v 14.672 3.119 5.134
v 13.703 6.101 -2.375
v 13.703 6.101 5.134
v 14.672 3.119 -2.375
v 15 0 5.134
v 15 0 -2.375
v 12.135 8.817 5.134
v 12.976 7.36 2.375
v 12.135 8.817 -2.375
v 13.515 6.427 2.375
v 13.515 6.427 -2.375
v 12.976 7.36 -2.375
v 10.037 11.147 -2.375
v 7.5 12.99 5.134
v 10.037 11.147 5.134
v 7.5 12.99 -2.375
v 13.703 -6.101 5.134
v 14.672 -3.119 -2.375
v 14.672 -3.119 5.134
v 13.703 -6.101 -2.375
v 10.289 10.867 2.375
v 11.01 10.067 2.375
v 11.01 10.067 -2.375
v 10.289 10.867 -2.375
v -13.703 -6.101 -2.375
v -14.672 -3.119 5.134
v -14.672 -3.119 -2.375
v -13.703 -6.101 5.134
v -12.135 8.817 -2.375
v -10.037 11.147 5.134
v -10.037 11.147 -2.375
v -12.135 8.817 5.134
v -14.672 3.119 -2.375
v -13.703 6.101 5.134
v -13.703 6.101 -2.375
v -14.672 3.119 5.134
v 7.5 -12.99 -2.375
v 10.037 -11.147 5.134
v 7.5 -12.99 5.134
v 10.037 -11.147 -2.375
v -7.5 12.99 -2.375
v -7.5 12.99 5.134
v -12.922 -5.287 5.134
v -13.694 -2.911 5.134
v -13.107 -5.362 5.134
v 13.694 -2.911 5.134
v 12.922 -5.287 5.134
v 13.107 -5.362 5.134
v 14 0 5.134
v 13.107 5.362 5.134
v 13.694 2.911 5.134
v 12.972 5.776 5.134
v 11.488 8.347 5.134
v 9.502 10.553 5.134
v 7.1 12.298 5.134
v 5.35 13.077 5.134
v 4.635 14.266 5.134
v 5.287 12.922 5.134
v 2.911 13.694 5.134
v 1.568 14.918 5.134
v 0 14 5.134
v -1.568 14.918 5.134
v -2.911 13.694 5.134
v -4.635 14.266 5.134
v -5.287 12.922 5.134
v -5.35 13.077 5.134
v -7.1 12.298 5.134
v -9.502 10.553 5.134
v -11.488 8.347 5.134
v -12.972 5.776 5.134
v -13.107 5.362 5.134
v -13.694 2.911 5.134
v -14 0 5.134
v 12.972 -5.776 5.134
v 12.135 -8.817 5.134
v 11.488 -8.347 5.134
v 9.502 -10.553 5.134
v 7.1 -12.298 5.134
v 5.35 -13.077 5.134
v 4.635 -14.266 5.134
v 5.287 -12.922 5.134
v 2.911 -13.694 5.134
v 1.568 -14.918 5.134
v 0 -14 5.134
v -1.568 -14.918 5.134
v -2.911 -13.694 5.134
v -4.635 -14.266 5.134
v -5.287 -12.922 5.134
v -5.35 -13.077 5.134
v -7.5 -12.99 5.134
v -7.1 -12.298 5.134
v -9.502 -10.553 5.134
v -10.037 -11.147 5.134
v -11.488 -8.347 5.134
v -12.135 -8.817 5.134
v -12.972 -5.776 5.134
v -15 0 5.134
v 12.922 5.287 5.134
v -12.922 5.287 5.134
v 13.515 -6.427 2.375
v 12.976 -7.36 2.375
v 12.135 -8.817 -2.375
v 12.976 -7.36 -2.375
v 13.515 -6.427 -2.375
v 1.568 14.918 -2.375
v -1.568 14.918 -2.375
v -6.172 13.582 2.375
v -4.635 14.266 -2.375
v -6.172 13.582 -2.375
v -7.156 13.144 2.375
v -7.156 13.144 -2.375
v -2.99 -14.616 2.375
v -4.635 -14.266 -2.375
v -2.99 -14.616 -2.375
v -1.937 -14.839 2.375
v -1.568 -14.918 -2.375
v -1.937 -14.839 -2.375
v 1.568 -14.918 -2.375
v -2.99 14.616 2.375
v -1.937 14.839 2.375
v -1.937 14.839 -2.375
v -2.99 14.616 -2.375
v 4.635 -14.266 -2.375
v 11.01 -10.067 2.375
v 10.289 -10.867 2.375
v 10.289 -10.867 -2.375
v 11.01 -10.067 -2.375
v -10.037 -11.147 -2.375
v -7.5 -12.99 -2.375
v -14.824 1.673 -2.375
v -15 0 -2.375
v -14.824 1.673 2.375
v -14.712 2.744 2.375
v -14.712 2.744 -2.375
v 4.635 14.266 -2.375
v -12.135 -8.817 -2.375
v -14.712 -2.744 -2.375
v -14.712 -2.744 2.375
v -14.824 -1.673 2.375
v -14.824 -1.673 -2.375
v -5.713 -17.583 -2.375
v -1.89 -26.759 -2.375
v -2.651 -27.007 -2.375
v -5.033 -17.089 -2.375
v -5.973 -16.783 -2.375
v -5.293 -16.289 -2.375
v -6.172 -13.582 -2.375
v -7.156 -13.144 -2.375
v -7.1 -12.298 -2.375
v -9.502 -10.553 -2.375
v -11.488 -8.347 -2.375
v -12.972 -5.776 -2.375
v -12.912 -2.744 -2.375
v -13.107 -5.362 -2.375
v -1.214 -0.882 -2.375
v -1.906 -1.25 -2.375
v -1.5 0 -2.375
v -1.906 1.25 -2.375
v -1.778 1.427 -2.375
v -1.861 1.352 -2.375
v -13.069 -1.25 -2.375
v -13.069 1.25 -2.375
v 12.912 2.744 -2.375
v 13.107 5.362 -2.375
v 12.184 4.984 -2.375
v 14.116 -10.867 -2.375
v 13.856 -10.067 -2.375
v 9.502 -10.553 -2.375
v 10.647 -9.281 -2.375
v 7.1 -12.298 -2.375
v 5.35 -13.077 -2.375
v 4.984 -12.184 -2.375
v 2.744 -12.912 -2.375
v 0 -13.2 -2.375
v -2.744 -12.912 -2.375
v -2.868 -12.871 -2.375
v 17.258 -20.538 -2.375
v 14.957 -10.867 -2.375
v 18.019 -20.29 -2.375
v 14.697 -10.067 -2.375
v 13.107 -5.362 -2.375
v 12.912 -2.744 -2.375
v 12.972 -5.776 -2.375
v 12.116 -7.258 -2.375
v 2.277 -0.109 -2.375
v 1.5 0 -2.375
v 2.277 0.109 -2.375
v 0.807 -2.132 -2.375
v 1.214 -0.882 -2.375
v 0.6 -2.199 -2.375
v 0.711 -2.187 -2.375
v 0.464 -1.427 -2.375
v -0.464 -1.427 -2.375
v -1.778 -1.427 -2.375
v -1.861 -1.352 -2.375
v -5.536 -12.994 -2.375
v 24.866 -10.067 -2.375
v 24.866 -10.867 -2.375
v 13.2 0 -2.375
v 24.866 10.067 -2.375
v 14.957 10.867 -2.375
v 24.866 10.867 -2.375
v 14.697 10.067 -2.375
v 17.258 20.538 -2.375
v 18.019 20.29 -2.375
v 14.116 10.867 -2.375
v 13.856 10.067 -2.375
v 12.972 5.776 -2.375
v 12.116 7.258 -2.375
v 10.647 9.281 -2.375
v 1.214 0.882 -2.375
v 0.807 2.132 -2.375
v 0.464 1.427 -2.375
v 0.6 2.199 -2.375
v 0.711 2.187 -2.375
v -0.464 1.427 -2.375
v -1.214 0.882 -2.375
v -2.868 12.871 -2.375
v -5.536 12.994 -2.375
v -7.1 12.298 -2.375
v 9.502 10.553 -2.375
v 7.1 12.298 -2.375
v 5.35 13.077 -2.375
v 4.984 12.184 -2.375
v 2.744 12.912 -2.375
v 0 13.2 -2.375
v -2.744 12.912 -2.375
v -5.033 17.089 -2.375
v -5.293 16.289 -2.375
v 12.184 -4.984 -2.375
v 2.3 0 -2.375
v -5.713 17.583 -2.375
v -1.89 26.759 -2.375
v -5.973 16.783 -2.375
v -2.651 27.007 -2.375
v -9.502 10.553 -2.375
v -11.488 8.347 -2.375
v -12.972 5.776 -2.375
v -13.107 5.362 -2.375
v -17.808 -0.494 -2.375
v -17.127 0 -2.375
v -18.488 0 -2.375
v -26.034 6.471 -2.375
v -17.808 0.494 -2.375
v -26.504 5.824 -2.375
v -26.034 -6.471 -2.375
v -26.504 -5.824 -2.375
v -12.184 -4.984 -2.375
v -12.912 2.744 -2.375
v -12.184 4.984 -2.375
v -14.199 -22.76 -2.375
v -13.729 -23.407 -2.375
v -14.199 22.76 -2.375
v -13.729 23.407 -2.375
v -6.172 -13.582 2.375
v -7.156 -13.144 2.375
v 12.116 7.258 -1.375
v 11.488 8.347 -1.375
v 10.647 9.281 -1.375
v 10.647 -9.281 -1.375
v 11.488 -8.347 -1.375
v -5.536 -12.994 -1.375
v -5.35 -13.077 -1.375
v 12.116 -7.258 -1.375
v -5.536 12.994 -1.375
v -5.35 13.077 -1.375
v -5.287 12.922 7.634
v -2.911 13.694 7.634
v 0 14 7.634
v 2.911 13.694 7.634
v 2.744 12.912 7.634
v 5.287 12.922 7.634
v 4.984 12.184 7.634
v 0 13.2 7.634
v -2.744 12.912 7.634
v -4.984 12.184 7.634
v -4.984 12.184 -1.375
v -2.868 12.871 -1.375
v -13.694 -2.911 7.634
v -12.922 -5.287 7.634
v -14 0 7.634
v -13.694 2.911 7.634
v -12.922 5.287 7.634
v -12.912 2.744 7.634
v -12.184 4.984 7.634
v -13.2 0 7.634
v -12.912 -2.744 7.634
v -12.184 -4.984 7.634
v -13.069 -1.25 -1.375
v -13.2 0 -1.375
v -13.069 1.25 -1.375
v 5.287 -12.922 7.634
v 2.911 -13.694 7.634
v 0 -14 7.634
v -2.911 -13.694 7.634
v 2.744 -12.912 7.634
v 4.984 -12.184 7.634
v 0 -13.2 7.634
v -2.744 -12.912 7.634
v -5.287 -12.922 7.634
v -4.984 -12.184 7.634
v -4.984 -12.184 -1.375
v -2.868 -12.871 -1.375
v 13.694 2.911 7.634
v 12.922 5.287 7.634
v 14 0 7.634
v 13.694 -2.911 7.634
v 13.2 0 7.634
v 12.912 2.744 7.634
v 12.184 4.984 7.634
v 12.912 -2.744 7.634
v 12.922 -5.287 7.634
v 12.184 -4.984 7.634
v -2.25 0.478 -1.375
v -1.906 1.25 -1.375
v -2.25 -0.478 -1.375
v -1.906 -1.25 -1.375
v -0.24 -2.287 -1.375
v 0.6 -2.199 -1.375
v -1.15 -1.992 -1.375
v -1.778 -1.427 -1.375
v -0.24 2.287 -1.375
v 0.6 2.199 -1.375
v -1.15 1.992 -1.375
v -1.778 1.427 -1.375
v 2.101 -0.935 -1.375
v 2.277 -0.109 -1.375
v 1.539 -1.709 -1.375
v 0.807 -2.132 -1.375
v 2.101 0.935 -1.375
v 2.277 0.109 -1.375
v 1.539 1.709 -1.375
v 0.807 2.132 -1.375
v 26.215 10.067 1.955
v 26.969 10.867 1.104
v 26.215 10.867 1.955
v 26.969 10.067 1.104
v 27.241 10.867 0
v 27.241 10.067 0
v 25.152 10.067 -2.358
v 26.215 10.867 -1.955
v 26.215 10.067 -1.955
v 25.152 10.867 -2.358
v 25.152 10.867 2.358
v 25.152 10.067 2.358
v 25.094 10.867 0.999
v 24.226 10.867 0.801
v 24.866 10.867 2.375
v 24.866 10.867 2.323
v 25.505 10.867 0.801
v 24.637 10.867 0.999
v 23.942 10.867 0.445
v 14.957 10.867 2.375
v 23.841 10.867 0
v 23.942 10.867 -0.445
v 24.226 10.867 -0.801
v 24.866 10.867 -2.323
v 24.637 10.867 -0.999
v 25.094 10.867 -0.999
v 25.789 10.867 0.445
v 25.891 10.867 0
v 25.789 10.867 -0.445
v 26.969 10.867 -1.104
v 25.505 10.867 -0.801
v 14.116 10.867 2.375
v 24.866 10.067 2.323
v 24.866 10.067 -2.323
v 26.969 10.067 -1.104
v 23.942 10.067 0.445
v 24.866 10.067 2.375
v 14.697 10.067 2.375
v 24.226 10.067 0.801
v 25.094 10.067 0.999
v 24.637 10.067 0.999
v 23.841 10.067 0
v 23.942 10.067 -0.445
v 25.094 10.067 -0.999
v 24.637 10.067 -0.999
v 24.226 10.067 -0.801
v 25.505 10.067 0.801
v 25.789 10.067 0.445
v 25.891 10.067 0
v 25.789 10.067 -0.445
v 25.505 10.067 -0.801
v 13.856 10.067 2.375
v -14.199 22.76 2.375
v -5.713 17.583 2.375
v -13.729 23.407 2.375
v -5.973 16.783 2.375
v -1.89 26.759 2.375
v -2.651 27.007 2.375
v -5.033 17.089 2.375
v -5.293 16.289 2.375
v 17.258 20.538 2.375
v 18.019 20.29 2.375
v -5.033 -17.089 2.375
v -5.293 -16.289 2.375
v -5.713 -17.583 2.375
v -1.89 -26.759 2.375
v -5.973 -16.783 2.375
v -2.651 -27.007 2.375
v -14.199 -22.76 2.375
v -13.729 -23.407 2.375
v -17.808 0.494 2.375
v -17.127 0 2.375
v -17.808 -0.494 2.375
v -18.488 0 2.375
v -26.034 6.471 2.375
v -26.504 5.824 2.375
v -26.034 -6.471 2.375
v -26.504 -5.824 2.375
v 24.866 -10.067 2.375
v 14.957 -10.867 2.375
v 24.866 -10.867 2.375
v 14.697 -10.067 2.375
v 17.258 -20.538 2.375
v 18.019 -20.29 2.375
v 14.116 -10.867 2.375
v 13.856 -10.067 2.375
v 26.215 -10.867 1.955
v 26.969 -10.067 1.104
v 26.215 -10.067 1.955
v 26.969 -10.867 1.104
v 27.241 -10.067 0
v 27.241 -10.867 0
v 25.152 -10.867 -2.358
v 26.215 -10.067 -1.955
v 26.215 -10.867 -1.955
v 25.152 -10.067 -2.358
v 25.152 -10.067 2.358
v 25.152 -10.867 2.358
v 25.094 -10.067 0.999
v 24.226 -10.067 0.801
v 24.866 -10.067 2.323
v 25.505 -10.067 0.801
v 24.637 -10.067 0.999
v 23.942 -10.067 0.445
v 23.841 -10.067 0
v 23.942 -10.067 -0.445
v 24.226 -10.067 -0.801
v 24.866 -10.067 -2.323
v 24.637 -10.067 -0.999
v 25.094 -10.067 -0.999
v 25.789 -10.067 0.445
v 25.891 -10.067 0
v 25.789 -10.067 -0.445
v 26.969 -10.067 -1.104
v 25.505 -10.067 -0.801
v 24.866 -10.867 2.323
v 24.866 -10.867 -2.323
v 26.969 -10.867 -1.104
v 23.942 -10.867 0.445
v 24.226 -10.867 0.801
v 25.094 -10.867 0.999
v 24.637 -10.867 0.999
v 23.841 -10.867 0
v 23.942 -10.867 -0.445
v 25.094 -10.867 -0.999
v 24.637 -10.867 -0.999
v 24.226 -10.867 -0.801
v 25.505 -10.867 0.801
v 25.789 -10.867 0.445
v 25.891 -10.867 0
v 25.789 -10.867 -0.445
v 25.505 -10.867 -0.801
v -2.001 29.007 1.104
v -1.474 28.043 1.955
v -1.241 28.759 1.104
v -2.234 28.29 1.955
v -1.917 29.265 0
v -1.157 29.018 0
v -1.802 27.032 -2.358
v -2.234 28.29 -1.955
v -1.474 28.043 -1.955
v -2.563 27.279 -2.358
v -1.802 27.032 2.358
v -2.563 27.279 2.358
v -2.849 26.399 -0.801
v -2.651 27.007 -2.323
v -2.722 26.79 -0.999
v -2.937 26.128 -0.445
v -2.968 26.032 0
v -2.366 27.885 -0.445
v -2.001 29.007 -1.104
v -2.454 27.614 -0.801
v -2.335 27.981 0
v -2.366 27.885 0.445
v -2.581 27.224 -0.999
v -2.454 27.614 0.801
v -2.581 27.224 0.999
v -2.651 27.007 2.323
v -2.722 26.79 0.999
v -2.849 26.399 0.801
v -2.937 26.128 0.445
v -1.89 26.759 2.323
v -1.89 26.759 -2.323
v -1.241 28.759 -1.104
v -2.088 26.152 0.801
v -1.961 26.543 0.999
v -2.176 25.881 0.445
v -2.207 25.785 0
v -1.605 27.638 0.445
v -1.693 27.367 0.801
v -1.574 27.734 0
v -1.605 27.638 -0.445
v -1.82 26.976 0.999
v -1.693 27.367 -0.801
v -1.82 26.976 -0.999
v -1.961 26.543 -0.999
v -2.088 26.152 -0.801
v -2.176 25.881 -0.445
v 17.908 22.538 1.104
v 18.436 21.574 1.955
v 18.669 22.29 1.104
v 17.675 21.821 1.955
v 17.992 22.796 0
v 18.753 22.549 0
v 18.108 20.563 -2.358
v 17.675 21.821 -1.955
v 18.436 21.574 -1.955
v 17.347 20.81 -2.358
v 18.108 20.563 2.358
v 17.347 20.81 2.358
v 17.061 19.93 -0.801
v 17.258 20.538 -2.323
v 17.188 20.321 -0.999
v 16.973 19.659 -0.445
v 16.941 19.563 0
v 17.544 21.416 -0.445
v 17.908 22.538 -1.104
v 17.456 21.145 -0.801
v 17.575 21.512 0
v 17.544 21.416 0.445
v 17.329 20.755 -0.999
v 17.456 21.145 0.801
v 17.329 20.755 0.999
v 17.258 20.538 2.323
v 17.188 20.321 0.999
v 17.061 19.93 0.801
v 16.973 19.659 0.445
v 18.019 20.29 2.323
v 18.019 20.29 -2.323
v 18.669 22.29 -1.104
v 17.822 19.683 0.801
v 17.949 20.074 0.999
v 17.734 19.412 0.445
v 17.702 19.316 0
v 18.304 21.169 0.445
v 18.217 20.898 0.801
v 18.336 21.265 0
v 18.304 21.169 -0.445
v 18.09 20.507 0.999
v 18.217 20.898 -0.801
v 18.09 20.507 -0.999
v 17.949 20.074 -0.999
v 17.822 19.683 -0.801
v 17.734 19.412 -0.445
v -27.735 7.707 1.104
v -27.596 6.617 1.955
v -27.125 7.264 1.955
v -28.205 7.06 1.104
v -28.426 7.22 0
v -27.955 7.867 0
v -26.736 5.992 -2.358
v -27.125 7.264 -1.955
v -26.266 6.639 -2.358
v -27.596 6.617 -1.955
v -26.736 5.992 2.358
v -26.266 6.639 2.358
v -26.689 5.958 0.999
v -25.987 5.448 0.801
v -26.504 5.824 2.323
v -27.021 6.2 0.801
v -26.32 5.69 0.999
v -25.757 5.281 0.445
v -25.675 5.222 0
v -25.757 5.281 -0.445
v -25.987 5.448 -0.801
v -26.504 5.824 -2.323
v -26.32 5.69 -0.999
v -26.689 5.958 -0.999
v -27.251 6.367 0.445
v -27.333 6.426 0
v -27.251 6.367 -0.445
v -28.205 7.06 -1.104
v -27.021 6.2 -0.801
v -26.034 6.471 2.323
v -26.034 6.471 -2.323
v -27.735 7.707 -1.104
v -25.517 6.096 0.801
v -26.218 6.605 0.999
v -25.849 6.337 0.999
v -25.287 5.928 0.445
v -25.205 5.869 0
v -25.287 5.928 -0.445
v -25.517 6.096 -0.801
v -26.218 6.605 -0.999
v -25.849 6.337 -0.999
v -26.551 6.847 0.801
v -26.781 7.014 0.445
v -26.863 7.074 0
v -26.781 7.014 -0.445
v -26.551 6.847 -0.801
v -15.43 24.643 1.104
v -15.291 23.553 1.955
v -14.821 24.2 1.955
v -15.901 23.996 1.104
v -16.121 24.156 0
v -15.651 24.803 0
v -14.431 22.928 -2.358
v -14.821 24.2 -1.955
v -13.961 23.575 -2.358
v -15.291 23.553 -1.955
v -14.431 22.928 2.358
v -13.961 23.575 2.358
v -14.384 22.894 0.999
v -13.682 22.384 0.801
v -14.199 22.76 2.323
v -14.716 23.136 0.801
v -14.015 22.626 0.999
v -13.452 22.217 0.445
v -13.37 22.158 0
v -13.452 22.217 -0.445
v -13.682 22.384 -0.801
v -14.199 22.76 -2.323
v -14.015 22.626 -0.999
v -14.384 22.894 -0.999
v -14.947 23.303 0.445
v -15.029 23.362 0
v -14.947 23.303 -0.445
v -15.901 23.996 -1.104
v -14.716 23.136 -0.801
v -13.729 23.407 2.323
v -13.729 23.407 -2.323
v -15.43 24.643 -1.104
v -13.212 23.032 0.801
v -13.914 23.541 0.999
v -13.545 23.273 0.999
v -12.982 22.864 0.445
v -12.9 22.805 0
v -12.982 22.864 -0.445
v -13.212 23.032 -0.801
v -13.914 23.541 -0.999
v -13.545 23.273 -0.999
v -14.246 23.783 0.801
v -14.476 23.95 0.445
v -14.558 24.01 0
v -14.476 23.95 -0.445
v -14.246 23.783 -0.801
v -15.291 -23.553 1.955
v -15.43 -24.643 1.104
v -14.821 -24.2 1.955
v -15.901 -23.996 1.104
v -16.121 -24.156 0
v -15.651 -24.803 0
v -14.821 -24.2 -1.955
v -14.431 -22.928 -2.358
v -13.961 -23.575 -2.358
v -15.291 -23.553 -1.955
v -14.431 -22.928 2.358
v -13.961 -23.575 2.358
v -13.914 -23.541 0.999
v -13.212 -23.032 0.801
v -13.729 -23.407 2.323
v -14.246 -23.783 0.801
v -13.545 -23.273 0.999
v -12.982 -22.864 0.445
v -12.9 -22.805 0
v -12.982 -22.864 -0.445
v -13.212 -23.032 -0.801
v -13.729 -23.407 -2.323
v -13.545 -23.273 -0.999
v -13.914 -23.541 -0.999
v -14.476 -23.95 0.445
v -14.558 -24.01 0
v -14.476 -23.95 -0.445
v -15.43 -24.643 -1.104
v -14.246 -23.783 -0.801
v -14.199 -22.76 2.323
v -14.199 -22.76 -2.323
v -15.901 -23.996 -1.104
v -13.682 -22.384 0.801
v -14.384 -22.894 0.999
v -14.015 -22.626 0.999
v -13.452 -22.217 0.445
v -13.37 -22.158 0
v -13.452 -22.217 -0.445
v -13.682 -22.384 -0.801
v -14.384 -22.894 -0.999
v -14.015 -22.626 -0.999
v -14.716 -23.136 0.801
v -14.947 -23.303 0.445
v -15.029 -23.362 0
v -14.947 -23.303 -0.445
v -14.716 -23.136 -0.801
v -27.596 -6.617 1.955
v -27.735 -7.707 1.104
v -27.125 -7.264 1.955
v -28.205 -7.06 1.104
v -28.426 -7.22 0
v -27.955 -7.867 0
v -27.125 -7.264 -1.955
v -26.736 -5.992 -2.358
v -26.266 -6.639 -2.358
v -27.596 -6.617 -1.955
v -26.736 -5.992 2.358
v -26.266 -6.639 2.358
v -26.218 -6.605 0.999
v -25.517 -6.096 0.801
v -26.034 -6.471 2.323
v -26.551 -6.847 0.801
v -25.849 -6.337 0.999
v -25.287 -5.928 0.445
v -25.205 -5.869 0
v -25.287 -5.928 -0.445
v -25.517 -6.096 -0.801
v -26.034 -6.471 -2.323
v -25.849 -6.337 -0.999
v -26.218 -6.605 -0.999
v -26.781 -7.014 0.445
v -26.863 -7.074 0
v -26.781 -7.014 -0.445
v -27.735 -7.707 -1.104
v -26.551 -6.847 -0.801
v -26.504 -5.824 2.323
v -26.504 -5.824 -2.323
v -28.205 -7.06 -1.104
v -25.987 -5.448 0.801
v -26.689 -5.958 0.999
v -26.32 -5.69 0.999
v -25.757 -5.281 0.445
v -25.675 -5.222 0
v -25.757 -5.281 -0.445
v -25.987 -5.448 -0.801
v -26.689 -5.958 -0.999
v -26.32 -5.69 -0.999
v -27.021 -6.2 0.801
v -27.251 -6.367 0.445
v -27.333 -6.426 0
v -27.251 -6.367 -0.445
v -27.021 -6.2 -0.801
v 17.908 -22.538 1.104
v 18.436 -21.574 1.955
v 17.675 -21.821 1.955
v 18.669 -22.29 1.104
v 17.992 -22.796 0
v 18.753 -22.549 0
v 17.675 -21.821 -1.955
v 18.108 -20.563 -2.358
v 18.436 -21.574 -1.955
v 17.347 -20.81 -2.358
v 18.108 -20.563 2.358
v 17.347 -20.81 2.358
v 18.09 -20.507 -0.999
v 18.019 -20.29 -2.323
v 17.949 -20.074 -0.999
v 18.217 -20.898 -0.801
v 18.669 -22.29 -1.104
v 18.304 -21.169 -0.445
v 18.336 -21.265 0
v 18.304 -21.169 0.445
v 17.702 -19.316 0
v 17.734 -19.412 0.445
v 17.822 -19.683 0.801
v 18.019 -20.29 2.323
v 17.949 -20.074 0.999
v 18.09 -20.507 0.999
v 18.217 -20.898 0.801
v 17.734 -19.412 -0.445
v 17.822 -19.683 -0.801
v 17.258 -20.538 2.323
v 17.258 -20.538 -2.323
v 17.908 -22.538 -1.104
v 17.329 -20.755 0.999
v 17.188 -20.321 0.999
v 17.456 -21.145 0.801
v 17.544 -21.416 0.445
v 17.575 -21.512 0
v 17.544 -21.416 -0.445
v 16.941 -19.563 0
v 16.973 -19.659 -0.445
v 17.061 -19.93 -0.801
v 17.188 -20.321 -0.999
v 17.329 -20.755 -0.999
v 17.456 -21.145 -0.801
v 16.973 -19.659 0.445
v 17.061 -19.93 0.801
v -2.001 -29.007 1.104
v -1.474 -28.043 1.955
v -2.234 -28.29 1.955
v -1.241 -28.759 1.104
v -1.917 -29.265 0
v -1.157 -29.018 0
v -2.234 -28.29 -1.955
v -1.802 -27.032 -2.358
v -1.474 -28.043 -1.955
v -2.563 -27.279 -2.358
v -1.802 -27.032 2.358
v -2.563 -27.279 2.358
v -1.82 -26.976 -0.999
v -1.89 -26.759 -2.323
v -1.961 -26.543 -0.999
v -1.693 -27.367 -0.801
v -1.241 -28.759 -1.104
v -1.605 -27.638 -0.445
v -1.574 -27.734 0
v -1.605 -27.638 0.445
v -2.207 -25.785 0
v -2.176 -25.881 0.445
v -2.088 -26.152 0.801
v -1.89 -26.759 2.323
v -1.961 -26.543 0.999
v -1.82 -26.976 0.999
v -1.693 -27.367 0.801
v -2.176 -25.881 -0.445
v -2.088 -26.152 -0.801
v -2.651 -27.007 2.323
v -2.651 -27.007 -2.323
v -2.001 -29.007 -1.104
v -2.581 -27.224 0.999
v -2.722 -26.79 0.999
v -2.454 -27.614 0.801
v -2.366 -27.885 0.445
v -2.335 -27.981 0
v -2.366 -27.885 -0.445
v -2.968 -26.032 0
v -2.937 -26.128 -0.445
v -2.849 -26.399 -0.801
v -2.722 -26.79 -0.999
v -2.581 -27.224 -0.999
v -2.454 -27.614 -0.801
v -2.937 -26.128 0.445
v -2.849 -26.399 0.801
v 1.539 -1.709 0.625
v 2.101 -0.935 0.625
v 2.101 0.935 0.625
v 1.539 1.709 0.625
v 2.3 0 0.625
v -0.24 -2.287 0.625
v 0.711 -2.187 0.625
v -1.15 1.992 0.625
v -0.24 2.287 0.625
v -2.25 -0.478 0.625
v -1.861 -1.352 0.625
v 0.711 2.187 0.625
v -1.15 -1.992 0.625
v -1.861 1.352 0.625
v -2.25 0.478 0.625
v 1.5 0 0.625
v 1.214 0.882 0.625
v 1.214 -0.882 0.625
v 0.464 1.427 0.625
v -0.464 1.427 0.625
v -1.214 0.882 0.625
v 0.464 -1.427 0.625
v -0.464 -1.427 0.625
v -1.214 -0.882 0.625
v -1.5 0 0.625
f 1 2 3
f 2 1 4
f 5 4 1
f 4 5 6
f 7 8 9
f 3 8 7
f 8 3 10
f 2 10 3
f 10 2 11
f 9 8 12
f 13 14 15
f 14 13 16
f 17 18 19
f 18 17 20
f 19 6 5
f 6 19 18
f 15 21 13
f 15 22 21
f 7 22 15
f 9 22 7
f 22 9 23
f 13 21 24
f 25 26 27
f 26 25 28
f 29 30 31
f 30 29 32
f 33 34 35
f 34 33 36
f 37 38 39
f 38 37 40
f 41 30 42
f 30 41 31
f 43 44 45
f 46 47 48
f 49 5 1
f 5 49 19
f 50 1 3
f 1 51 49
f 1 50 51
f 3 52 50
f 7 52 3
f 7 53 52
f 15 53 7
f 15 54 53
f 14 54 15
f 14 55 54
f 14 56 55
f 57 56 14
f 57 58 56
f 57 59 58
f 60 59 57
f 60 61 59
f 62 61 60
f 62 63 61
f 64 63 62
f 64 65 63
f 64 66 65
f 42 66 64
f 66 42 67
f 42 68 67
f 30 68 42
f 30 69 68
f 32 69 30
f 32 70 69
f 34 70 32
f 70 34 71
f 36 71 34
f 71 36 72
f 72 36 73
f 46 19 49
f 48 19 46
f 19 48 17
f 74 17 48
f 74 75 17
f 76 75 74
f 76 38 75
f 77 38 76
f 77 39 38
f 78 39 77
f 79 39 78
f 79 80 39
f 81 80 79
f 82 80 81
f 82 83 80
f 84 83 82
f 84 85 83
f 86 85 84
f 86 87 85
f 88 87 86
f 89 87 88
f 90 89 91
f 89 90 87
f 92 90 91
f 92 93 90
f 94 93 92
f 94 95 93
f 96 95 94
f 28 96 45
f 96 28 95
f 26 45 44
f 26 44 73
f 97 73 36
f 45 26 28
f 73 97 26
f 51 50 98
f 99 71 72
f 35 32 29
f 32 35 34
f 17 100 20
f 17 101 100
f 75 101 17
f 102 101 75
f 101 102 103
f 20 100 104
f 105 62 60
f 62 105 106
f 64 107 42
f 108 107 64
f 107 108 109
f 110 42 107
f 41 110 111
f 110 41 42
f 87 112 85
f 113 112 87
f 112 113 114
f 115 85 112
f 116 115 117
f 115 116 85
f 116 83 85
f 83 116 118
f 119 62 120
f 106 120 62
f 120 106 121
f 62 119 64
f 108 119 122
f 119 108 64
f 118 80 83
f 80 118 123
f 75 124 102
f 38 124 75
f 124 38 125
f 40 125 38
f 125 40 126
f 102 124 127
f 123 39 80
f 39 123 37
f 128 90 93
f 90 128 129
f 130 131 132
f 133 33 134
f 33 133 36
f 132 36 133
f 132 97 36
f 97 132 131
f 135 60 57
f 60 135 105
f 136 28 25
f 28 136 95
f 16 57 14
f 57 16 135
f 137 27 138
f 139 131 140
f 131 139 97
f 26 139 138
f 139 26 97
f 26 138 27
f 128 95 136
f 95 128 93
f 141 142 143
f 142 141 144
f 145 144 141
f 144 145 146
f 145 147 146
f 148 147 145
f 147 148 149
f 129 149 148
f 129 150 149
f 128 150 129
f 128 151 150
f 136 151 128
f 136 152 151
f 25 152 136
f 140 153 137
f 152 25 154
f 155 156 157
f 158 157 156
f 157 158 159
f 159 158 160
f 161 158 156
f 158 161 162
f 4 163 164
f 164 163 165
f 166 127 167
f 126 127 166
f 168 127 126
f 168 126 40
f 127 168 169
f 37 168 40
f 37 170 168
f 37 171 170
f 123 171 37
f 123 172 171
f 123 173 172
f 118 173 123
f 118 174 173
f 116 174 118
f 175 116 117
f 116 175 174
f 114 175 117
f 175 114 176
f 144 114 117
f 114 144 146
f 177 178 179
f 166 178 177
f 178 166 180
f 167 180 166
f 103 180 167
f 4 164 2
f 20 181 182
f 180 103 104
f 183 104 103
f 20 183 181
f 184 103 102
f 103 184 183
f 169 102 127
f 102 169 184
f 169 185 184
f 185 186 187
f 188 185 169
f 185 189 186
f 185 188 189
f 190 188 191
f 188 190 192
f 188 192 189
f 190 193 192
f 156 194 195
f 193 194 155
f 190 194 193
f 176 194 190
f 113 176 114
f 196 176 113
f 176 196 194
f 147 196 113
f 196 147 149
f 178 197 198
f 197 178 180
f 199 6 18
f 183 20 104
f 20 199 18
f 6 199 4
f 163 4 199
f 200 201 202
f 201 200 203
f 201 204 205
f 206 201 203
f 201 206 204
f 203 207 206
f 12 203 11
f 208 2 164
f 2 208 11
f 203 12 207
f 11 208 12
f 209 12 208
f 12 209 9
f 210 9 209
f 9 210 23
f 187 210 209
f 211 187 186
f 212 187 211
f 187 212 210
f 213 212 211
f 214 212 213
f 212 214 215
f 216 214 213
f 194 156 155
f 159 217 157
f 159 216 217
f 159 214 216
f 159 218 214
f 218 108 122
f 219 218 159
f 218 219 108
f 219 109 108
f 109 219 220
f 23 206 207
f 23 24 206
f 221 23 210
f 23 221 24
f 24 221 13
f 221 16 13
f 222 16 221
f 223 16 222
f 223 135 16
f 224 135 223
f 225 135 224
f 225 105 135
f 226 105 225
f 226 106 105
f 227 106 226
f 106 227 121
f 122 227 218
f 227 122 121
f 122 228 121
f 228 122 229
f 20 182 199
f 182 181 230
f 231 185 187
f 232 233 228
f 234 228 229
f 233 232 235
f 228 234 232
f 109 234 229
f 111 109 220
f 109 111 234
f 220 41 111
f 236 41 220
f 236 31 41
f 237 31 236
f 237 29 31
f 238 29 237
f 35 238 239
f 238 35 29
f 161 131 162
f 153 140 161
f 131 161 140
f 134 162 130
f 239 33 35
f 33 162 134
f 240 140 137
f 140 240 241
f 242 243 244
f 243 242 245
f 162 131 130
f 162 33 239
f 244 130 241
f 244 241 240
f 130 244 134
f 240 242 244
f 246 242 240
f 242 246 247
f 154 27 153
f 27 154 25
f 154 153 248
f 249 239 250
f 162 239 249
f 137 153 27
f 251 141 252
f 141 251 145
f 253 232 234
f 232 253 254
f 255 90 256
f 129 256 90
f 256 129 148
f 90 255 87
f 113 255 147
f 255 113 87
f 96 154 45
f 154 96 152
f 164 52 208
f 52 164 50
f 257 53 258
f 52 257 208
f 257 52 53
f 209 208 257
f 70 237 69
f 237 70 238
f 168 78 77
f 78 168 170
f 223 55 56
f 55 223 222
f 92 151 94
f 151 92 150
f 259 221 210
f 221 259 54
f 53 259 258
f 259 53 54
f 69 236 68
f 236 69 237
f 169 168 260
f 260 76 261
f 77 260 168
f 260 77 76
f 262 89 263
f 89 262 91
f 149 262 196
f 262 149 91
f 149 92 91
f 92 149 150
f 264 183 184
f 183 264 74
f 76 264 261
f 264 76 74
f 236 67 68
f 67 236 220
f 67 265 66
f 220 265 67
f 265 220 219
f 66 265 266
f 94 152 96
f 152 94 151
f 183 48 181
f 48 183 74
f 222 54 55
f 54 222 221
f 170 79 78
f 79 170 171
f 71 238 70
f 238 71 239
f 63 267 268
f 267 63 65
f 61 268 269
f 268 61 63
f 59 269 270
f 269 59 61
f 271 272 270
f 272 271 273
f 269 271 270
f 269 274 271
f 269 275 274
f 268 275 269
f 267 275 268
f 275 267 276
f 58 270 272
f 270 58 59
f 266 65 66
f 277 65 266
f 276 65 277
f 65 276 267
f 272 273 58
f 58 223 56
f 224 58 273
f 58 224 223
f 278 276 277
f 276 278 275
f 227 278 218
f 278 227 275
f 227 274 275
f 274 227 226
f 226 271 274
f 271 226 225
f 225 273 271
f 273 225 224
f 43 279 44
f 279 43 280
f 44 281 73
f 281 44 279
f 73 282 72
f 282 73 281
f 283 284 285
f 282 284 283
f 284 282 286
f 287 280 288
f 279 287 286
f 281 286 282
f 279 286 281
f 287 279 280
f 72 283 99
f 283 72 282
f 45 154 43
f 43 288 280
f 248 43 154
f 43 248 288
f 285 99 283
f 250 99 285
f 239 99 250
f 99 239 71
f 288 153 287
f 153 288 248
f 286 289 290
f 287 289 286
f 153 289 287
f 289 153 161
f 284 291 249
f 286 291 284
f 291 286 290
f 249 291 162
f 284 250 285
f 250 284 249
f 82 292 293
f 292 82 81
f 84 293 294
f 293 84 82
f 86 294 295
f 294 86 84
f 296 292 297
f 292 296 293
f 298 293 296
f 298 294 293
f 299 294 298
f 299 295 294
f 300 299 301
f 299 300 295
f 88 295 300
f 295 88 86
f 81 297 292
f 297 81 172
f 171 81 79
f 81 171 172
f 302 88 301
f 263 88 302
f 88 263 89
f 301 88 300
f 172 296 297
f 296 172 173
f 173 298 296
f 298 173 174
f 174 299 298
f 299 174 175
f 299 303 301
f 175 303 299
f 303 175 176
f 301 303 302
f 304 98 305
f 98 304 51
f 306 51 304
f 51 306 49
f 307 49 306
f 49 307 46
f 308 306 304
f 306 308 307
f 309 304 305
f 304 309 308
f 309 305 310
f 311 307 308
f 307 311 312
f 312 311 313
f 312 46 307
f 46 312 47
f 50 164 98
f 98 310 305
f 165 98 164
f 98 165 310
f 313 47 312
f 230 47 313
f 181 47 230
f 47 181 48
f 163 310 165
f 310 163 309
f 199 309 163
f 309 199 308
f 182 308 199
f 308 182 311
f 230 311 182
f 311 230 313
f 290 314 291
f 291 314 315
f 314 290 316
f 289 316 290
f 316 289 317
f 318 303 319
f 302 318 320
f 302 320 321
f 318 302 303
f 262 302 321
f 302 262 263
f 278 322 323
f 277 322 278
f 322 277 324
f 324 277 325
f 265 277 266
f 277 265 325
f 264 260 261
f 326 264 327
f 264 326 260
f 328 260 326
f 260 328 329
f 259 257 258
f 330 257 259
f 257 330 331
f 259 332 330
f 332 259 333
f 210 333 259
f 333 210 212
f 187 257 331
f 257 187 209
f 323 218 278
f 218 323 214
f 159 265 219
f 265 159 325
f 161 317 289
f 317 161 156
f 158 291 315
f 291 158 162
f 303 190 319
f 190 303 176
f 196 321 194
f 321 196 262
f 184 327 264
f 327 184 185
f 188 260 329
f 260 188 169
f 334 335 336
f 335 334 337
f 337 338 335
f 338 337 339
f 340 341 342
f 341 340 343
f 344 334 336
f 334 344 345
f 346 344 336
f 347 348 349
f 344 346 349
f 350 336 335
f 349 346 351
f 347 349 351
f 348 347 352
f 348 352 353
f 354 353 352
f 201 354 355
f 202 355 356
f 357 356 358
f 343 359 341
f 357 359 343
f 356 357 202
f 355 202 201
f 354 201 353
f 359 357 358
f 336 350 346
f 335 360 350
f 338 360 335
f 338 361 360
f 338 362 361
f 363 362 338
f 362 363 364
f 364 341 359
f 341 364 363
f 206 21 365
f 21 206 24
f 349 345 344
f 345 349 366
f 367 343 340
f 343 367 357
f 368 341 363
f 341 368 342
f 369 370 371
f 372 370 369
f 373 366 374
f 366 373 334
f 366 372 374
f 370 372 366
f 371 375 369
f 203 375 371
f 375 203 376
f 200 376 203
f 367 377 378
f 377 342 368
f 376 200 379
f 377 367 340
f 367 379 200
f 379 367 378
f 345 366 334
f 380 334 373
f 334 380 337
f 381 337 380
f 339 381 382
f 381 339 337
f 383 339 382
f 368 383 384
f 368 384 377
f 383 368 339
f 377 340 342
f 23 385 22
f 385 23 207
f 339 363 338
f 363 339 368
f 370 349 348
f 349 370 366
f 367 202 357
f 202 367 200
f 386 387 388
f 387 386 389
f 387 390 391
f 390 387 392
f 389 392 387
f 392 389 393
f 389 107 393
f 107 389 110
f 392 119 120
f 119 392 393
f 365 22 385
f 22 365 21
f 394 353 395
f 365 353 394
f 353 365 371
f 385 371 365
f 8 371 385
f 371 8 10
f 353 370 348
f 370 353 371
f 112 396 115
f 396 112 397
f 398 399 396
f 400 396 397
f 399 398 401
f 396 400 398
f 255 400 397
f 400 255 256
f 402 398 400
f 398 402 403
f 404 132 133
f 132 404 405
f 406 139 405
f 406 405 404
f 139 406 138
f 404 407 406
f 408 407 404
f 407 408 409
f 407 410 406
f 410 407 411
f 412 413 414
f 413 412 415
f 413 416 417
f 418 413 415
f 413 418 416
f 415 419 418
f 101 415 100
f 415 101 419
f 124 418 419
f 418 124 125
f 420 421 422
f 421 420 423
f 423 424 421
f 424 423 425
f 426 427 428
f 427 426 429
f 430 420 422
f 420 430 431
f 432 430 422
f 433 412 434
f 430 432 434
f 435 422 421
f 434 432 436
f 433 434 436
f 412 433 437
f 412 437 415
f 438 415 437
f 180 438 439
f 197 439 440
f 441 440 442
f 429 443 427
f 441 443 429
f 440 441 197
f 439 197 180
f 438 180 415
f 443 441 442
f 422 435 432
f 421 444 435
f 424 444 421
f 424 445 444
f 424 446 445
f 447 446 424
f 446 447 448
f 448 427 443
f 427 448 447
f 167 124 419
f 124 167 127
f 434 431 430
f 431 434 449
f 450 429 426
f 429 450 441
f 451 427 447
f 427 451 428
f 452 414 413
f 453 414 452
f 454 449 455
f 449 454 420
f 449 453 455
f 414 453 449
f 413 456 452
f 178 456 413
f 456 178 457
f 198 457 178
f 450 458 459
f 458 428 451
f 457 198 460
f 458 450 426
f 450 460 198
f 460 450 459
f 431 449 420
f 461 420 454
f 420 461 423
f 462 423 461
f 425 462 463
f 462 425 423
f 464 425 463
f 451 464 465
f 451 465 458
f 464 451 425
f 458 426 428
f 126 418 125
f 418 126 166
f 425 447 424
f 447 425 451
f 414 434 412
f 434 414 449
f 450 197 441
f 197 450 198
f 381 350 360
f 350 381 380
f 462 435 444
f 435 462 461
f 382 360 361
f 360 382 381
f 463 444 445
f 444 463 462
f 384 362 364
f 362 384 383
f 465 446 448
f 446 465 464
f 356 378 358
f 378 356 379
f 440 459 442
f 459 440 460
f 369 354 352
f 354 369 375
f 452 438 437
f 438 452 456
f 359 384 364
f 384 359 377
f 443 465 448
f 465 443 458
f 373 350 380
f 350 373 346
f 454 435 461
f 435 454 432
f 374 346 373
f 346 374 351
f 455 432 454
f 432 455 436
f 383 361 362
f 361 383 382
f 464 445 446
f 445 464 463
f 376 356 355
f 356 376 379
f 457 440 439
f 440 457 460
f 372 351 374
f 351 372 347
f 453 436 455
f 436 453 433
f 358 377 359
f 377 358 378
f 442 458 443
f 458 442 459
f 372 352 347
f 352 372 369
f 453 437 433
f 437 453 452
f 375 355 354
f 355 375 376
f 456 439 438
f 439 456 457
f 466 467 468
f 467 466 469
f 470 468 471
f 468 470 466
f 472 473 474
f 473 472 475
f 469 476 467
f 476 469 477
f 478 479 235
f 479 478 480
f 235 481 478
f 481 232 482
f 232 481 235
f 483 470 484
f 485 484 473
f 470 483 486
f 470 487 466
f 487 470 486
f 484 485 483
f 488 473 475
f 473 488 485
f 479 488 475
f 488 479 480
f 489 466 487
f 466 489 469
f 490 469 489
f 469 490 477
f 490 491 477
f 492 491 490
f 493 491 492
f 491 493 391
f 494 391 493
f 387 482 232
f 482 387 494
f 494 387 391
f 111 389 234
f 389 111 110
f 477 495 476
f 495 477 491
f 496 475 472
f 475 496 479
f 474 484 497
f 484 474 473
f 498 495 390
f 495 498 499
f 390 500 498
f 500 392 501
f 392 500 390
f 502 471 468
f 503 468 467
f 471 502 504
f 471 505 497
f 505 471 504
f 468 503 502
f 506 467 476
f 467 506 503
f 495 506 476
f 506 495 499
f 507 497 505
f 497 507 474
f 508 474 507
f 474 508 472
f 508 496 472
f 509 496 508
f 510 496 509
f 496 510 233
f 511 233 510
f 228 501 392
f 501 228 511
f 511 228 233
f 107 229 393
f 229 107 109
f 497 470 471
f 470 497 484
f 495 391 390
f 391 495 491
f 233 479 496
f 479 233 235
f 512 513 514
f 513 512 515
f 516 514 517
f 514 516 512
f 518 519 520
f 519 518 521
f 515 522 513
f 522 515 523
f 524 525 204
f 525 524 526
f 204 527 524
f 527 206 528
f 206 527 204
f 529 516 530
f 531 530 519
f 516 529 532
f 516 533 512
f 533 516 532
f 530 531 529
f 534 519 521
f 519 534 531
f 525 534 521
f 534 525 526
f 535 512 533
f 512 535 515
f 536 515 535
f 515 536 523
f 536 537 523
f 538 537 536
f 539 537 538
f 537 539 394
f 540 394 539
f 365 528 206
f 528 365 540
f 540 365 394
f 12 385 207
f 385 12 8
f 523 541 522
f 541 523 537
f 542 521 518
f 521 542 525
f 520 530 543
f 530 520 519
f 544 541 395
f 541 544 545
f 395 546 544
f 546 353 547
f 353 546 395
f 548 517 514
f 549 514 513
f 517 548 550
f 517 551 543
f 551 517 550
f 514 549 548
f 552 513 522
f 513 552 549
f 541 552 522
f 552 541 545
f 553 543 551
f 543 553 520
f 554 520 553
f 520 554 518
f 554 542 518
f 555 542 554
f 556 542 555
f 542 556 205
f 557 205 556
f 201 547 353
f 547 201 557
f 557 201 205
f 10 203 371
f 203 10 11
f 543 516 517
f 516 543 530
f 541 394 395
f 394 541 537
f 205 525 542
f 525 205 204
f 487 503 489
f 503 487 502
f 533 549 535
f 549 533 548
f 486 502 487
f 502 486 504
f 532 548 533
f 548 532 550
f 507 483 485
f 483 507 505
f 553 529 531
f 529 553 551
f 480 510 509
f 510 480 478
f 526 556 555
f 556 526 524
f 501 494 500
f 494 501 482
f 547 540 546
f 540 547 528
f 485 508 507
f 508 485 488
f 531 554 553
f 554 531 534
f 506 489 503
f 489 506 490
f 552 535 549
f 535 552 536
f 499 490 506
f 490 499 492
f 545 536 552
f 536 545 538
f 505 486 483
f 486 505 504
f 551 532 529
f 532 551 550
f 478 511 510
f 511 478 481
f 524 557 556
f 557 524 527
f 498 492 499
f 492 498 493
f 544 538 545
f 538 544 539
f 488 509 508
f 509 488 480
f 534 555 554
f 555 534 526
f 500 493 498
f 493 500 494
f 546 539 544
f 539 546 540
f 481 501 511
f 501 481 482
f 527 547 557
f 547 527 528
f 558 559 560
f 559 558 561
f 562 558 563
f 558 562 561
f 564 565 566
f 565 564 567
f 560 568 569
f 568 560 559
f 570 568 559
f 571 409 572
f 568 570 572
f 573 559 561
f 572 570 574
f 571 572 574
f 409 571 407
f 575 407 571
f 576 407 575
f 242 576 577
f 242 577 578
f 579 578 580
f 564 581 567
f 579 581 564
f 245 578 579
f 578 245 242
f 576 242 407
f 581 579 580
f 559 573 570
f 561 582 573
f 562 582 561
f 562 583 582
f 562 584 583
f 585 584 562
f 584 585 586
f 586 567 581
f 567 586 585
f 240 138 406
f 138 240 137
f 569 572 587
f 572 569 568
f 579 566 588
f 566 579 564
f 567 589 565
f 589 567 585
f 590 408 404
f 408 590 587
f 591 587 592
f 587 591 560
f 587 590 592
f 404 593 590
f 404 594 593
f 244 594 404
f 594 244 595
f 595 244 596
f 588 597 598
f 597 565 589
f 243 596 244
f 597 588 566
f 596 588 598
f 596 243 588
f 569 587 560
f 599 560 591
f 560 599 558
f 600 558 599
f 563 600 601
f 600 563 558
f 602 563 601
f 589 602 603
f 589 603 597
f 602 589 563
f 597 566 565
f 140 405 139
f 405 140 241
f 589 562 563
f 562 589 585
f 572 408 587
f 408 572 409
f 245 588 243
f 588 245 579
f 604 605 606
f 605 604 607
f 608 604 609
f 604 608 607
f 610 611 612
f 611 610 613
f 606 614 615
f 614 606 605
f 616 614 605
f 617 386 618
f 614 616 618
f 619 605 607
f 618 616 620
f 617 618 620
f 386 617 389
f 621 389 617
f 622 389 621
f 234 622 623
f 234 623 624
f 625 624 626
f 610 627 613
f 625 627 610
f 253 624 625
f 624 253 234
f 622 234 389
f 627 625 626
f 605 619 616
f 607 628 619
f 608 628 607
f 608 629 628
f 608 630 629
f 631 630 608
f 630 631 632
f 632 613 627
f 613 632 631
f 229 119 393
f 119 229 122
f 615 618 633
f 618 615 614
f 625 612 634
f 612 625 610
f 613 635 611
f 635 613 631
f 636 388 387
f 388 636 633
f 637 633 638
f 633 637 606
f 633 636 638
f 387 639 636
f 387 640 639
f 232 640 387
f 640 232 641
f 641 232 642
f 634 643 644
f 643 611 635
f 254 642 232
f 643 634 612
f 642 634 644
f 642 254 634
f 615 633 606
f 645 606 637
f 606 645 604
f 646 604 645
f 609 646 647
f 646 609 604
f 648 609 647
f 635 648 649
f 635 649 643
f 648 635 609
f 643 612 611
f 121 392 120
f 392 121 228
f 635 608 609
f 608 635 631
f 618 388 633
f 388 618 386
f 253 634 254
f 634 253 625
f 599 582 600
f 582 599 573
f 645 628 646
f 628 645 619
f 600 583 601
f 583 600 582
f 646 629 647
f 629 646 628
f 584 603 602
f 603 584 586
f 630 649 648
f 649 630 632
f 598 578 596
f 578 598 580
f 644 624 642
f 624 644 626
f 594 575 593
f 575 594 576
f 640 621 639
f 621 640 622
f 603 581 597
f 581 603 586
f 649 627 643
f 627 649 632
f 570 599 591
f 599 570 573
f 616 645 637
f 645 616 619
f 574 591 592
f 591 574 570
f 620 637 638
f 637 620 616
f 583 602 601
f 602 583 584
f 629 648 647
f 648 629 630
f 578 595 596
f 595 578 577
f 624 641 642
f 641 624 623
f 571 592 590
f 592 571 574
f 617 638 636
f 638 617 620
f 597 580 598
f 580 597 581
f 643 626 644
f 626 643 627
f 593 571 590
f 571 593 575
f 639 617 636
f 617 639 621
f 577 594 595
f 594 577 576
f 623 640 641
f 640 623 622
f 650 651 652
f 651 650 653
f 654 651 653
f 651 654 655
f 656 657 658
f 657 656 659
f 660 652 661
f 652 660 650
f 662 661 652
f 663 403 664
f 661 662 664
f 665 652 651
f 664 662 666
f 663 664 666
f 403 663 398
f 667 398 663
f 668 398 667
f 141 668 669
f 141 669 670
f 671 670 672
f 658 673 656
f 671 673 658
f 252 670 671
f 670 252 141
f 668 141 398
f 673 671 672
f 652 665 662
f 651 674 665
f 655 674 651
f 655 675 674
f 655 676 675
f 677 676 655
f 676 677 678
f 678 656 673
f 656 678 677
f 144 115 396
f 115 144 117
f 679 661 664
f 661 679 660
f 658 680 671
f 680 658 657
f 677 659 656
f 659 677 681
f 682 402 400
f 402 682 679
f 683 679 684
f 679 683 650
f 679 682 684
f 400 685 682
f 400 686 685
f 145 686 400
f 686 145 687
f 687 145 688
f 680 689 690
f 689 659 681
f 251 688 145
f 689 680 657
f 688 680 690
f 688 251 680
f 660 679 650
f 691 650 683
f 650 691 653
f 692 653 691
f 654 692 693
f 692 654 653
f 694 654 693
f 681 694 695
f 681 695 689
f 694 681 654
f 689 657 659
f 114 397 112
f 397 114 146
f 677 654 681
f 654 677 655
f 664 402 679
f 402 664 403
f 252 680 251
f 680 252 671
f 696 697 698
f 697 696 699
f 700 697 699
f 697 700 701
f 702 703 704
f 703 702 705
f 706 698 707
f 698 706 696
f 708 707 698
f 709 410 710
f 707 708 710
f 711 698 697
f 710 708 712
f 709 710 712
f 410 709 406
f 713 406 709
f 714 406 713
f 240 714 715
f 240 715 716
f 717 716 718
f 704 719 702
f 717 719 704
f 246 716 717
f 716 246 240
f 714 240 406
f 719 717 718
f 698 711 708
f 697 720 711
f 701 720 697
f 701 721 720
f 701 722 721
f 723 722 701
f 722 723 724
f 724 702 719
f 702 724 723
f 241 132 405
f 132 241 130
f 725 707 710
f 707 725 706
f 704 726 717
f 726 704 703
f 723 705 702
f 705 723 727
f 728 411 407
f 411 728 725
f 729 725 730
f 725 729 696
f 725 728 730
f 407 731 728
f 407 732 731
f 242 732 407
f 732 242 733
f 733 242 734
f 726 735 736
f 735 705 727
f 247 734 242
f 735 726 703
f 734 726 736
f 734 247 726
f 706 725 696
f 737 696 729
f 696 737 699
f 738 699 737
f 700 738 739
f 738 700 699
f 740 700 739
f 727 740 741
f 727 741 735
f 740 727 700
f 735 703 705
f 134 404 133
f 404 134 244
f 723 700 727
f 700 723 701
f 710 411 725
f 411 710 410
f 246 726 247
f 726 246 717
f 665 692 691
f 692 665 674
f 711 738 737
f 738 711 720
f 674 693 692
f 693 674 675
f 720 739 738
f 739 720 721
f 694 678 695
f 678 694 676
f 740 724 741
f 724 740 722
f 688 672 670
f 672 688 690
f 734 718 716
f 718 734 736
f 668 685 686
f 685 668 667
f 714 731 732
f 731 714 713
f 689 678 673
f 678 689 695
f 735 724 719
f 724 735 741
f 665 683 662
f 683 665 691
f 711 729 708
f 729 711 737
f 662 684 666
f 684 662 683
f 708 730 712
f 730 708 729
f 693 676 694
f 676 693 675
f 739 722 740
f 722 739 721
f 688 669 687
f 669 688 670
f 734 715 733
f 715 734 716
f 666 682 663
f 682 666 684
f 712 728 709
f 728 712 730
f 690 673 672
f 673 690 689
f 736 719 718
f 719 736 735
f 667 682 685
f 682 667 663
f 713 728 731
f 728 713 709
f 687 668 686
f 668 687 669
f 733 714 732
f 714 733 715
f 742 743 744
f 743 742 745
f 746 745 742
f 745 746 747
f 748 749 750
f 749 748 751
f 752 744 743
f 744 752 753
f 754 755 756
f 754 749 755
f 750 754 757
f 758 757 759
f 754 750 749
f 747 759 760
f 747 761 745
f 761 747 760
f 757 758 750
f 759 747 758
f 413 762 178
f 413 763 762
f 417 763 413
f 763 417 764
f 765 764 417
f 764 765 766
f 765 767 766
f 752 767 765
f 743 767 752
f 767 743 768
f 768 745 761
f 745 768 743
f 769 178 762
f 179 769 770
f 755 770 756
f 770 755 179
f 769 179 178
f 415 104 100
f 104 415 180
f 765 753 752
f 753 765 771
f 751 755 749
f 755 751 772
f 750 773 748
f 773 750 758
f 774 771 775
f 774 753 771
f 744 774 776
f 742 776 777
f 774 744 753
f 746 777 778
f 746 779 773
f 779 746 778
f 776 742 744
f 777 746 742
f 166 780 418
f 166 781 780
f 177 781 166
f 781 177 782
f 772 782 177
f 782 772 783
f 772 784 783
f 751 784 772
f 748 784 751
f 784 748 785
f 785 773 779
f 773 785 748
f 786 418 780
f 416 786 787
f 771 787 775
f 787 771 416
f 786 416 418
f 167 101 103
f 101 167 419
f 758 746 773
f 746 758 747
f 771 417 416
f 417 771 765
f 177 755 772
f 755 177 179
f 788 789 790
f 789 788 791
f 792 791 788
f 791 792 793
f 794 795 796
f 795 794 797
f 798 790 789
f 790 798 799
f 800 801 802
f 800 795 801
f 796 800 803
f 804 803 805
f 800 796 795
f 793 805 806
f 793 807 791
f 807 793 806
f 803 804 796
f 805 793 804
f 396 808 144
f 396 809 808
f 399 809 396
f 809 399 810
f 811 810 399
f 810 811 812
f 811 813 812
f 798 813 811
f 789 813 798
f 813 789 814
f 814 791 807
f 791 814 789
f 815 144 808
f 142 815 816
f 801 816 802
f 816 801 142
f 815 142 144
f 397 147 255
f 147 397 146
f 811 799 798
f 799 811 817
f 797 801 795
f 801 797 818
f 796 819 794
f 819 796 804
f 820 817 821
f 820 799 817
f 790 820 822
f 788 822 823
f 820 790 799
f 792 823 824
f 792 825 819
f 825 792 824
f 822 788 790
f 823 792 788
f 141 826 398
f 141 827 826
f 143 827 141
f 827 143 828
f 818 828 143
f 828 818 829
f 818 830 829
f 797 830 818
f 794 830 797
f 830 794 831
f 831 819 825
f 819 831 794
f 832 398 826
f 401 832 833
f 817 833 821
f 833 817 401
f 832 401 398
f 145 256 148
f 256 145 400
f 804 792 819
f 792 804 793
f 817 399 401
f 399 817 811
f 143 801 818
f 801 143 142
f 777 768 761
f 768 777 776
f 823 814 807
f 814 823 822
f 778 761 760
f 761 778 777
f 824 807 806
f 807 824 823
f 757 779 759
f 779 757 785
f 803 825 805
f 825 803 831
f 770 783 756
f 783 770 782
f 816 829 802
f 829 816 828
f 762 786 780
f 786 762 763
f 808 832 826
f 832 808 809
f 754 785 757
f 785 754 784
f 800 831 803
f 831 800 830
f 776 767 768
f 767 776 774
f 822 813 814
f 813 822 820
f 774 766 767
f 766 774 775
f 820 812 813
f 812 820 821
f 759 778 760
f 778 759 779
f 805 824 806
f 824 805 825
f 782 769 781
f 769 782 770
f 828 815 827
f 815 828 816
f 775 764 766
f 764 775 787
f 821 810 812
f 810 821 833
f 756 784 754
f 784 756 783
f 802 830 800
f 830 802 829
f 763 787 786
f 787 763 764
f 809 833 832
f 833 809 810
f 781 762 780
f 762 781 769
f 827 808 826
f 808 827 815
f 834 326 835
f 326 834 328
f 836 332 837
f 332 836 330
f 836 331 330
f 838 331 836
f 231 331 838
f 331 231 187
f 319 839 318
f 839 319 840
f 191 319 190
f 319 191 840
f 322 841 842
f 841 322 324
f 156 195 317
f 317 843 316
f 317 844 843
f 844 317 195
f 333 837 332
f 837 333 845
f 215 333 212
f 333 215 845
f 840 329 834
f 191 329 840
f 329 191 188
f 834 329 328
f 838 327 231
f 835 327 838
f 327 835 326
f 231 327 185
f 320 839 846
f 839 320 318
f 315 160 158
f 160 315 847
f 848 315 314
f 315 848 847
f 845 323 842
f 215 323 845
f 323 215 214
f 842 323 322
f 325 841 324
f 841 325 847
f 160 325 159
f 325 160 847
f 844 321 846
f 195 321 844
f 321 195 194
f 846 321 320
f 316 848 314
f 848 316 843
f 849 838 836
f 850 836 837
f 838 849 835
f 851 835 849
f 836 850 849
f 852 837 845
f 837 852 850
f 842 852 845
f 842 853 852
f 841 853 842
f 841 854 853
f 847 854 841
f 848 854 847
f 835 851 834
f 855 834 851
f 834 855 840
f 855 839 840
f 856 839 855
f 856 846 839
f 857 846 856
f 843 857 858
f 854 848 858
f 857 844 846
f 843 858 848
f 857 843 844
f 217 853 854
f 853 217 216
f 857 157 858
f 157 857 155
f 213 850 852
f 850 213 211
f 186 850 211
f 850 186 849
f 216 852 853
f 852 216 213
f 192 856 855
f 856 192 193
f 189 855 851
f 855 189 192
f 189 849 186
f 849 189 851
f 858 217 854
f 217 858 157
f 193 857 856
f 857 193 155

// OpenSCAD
/*
	.scad file created for the subwheel system of the 3D Printable Omni-Wheels used for a robot.
	
	
	Author 	= Xasin
	Website = https://www.github.com/xasin/hexa-bot.git
	Created	= 17.09.15
*/


function subwheelRadius(n, r) = r - cos(360/(2*n) + subwheelOverlap)*r + subwheelBaseSize;		//Calculate the radius of a standard subwheel at largest point (Center)
function wheelOffset(n, r) = cos(360/(2*n) + subwheelOverlap)*r;						//Calculate the offset of a subwheel that is required to shift it so that it aligns with the main circle (CAUTION Does not implement subwheel size shift!!)
function connectorOffset(n, r) = (sin(360/(2*n) + subwheelOverlap)*r);					//Calculate the offset for the cuts on the wheels. (Y axis on the 2D model of a subwheel before being rotated.
	
$fs = 1;

//What to generate - 1 means base frame, 2 means subwheel piece
generate = 1;

//GENERATION VARIABLES 
//Number of all subwheels to create. (Has to be a round number!!)
num = 5*2;	
//Radius of the omni-wheel.
radius = 30;	

//CONNECTION AXIS VARIABLES 
//Diameter of the axis the Omni-Wheel will be connected to.
axisDiameter = 3;	
//Height of the cylinder that will connect axis and omniwheel together.
axisConnectorHeight = 3; 	
//Thickness of the axis connector.
axisConnectorThickness = 0.8; 	

//SUBWHEEL VARIABLES
//Size of the subwheels at their smallest point (The edge)
subwheelBaseSize = 3.5;
//The additional size that will be cut out around the subwheels to ensure smooth movement
subwheelPlay = 1; 		
//By what angle should the wheels overlap? This should result in smoother running, but at the same time might cause problems if this value is too big.
subwheelOverlap = 1; 	

//SUBWHEEL AXIS HOLE VARIABLE
subwheelAxisDiameter = 1.75;
subwheelAxisPlay = 0.4;

//SUBWHEEL CONNECTOR VARIABLES
//Radius of the connectors to the subwheels (Best is slightly smaller than the subwheel.
cRad = subwheelAxisDiameter/2 + 1.5; 	
//Thickness of the connectors.
cThick = 0.8; 					
//Play room for the connector ports (distance to the subwheel)
cPlay = 0.3; 					

//FRAME VARIABLES
//frameRadius = connectorOffset(num, radius) + cPlay + cThick;	
//Radius of the frame Cylinder
frameRadius = 15;
//Height of the frame (not including the connectors
frameHeight = cRad + subwheelRadius(num, radius);
//Thickness of the main frame
frameThickness = 0.8;		

//STABILITY BEAM VARIABLES
//Thickness of the stability beams
beamThickness = 2.5; 	
//How many beams should be created?
beamNum = 5;

//CONNECTOR VARIABLES
//Thickness of the vertical connectors
connectorThickness = 0.8;	
//Inwards shift of the vertical connector beams (for smoother connection)
connectorInShift = 0.2;		
//Height of the connector pieces above the main frame.
connectorHeight = 2.5;		
//How many connectors should be created
connectorNum = 4;			


module shine(angle=10, length=10, height=10, center=true) {
    if($children != 0) {
        intersection() {
            linear_extrude(height) {
                if(center) {
                    polygon([[0,0] , [length*cos(angle/2),length*sin(angle/2)] , [length,0] , [length*cos(-angle/2),length*sin(-angle/2)]]);
                }
                else {
                    polygon([[0,0] , [length*cos(angle),length*sin(angle)] ,  [length*cos(angle/2),length*sin(angle/2)] , [length,0]]);
                }
            } 
            children(); 
        }
    }   
    else {
        linear_extrude(height) {
            if(center) {
                polygon([[0,0] , [length*cos(angle/2),length*sin(angle/2)] , [length,0] , [length*cos(-angle/2),length*sin(-angle/2)]]);
            }
            else {
                polygon([[0,0] , [length*cos(angle),length*sin(angle)] ,  [length*cos(angle/2),length*sin(angle/2)] , [length,0]]);
            }
        }
    }  
}  

module subwheelBase(n, r=20, p=0, shift = subwheelBaseSize, split=true, positioned=true) {  //The base structure of a Subwheel, basically a slice of a circle of the radius of the wheel, cut down to be rotated into a proper subwheel for a wheel of Radius R with N Subwheels.
	
	//Position the wheel according to the given parameters (Aling it to the outside of the main wheel and rotate it around into position p.)
	render(4) if(positioned) {
		//Rotate to the according outside position.
		rotate([0, 0, (360/n) * p])
		//Translate to the edge of the circle
		translate([ wheelOffset(n, r) - shift, 0, 0])
		//Rotate into horizontal position
		rotate([-90, 0, 0]) 
		//The main core of the subwheel
		subwheelBase(n, r, p, shift, split, false);
	}
	//Generate a standard subwheel without moving it around.
	else {
		render(convexity=4) difference() {				//Render the subwheel and make it hollow.
			union() {
				rotate_extrude() difference() {		//Generate the main subwheel
					intersection() {					//2D Model for the basic subwheel
						translate([ - wheelOffset(n, r) + shift, 0]) circle(r=r, $fn = 70);		//Main circle	
						translate([0, - sin(360/(2*n) + subwheelOverlap)*r]) square(sin(360/(2*n) + subwheelOverlap)*r *2);			//Intersecting square to only have the desired part of the circle
					}	
						
				}
				translate([0, 0, - sin(360/(2*n) + subwheelOverlap)*r]) cylinder(r=shift, h= sin(360/(2*n) + subwheelOverlap)*r *2);	//Central cylinder inside for the axis.
			}
			
			if(split) {
				translate([0,0,-(sin(360/(2*n) + subwheelOverlap)*r)]) cylinder(d= subwheelAxisDiameter + subwheelAxisPlay, h= 2* sin(360/(2*n) + subwheelOverlap)*r,$fn=15);	//Slot for the Filament-Axis, rolling
			}
		}
	}
}

//Create the connecting beams for the subwheels
module subwheelConnector(n, r, i) {
	render(convexity = 3)
	rotate([0,0, (360/n)*i]) 
	difference() {				//The difference cuts the hole for the axis into the connectors
		intersection() {		//The intersection makes sure that the subwheel connectors don't poke outside of the wheel radius. This should not be nececary, but for smaller subwheel base sizes might be desirable.
			union() {		//The cylinders here are the end cylinders on either side of the connector, the cubes are the beams that connect those cylinders to the main frame.
				translate([wheelOffset(n, r) - subwheelBaseSize, connectorOffset(n, r) + cPlay + cThick]) rotate([90, 0, 0]) cylinder(r= cRad, h= cThick, $fn = 13);		
				
				translate([0, connectorOffset(n, r) + cPlay, -cRad]) 
					cube([wheelOffset(n, r) - subwheelBaseSize, cThick, cRad*2]);
				
				translate([wheelOffset(n, r) - subwheelBaseSize, -connectorOffset(n, r) - cPlay]) rotate([90, 0, 0]) cylinder(r= cRad, h= cThick, $fn = 13);
						
				translate([0, -connectorOffset(n, r) - cPlay - cThick, -cRad]) 
					cube([wheelOffset(n, r) - subwheelBaseSize, cThick, cRad*2]);
			}
			
			translate([0,0, -cRad]) cylinder(r=r - 0.3, h= cRad*2);
		}
		
		translate([wheelOffset(n, r) - subwheelBaseSize, connectorOffset(n, r) + 5, 0]) rotate([90,0,0]) cylinder(d= subwheelAxisDiameter + 0.3, h= connectorOffset(n, r)*2 + 10, $fn=14);		//Cylinder for the axis hole.
	}
}

//Create a set of subwheels as they would be normally positioned. Inflated = true makes them bigger; useful for creating space around the wheels.
module subwheelSet(n, r, inflated=false) {
	for(i=[0:2:n]) { 	
		if(inflated) {		
			subwheelBase(n, r, i, shift = subwheelBaseSize + subwheelPlay, split=false);									//Create a /bigger/ subwheel in normal, ground position.
		}
		else {
			subwheelBase(n, r, i);									//Do the same as above, however using default subwheels instead of bigger subwheels here.
		}
	}
}

//Create a subwheel connector set for the according wheel of size r with n subwheels.
module connectorSet(n, r) {
	for(i=[0:2:n]) {
		subwheelConnector(n, r, i);
	}
}

//Create the central cylinder piece.
module centralCylinder(n, r) {
	render(convexity = 4) translate([0,0, - cRad]) difference() {
		cylinder(r= frameRadius, h= frameHeight);		//Create the central cylinder.
		cylinder(r= frameRadius - frameThickness, h= frameHeight);	//Hollow it out
	}
}
		
//Create the pieces that connect the two Omniwheel pieces together
module interconnectorPiece(r) {
	difference() {
		shine(height= frameHeight + connectorHeight, angle=(360/connectorNum/2) - 0.5, length= r)
		//"Shine" is a custom function that cuts down an object to a specific angle
		union() {
			cylinder(r= frameRadius - 0.1, h= frameHeight);		//Cylinder piece to connect the connector to the main frame.
			cylinder(r= frameRadius - frameThickness - connectorInShift, h= frameHeight + connectorHeight);		//Cylinder piece for the actual interconnector. This one is slightly smaller due to printing imperfections, thusly making sure that the pieces fit together nicely.
		}
		cylinder(r= frameRadius - frameThickness - connectorThickness - connectorInShift, h= frameHeight + connectorHeight);		//Hollow the interconnection pieces out so that they have the correct thickness.
		
	}
}
//Create the interconnections between two wheel pieces
module interconnections(n, r) {
	render(convexity= 2) translate([0,0, -cRad])
		for(i=[0:(360/connectorNum):360]) 
			rotate([0,0, i + 360/connectorNum])											
			interconnectorPiece(r);	
}

//Create the structural beams inside the subwheel for better stability.
module structuralBeams() {
	render(convexity = 4) translate([0,0, -cRad]) intersection() {
		cylinder(r= frameRadius, h= cRad*2);		//Make sure that the structural beams don't poke out of the main frame.
		
		for(i=[0:360/beamNum:360]) 
			rotate([0,0, i + 360/beamNum/2]) translate([0, -beamThickness/2, 0]) cube([frameRadius, beamThickness, 1]);		//Create the beams.
	}
}

//The Mainframe of the OmniWheel
module omniWheel(n, r, subwheels = false) {
	difference() {  
		union() {
		
			//Central Cylinder 
			centralCylinder(n, r);
			
			//Cylinder Interconnections
			interconnections(n, r);

			//Structural beams
			structuralBeams();
			
			//Connectors
			render(convexity = 5) difference() {
				connectorSet(n, r);			//Create the connectors
				translate([0,0, -cRad]) cylinder(r= frameRadius - 0.001, h= frameHeight); //Make sure they don't enter the central cylinder
			}
			
			translate([0,0, -cRad]) cylinder(d= axisDiameter + 2* axisConnectorThickness, h= axisConnectorHeight);
		}
		subwheelSet(n, r, true); 	//Make sure that there is enough space for the subwheels.
		translate([0,0, -cRad]) cylinder(d= axisDiameter, h= frameHeight);
	}
	
	%subwheelSet(n, r);		//Create subwheels around the model for a better visual inspection.
}

if(generate == 1) {
	omniWheel(num, radius, true);
}
else if(generate == 2) { 
	subwheelBase(num, radius, positioned=false);
}
